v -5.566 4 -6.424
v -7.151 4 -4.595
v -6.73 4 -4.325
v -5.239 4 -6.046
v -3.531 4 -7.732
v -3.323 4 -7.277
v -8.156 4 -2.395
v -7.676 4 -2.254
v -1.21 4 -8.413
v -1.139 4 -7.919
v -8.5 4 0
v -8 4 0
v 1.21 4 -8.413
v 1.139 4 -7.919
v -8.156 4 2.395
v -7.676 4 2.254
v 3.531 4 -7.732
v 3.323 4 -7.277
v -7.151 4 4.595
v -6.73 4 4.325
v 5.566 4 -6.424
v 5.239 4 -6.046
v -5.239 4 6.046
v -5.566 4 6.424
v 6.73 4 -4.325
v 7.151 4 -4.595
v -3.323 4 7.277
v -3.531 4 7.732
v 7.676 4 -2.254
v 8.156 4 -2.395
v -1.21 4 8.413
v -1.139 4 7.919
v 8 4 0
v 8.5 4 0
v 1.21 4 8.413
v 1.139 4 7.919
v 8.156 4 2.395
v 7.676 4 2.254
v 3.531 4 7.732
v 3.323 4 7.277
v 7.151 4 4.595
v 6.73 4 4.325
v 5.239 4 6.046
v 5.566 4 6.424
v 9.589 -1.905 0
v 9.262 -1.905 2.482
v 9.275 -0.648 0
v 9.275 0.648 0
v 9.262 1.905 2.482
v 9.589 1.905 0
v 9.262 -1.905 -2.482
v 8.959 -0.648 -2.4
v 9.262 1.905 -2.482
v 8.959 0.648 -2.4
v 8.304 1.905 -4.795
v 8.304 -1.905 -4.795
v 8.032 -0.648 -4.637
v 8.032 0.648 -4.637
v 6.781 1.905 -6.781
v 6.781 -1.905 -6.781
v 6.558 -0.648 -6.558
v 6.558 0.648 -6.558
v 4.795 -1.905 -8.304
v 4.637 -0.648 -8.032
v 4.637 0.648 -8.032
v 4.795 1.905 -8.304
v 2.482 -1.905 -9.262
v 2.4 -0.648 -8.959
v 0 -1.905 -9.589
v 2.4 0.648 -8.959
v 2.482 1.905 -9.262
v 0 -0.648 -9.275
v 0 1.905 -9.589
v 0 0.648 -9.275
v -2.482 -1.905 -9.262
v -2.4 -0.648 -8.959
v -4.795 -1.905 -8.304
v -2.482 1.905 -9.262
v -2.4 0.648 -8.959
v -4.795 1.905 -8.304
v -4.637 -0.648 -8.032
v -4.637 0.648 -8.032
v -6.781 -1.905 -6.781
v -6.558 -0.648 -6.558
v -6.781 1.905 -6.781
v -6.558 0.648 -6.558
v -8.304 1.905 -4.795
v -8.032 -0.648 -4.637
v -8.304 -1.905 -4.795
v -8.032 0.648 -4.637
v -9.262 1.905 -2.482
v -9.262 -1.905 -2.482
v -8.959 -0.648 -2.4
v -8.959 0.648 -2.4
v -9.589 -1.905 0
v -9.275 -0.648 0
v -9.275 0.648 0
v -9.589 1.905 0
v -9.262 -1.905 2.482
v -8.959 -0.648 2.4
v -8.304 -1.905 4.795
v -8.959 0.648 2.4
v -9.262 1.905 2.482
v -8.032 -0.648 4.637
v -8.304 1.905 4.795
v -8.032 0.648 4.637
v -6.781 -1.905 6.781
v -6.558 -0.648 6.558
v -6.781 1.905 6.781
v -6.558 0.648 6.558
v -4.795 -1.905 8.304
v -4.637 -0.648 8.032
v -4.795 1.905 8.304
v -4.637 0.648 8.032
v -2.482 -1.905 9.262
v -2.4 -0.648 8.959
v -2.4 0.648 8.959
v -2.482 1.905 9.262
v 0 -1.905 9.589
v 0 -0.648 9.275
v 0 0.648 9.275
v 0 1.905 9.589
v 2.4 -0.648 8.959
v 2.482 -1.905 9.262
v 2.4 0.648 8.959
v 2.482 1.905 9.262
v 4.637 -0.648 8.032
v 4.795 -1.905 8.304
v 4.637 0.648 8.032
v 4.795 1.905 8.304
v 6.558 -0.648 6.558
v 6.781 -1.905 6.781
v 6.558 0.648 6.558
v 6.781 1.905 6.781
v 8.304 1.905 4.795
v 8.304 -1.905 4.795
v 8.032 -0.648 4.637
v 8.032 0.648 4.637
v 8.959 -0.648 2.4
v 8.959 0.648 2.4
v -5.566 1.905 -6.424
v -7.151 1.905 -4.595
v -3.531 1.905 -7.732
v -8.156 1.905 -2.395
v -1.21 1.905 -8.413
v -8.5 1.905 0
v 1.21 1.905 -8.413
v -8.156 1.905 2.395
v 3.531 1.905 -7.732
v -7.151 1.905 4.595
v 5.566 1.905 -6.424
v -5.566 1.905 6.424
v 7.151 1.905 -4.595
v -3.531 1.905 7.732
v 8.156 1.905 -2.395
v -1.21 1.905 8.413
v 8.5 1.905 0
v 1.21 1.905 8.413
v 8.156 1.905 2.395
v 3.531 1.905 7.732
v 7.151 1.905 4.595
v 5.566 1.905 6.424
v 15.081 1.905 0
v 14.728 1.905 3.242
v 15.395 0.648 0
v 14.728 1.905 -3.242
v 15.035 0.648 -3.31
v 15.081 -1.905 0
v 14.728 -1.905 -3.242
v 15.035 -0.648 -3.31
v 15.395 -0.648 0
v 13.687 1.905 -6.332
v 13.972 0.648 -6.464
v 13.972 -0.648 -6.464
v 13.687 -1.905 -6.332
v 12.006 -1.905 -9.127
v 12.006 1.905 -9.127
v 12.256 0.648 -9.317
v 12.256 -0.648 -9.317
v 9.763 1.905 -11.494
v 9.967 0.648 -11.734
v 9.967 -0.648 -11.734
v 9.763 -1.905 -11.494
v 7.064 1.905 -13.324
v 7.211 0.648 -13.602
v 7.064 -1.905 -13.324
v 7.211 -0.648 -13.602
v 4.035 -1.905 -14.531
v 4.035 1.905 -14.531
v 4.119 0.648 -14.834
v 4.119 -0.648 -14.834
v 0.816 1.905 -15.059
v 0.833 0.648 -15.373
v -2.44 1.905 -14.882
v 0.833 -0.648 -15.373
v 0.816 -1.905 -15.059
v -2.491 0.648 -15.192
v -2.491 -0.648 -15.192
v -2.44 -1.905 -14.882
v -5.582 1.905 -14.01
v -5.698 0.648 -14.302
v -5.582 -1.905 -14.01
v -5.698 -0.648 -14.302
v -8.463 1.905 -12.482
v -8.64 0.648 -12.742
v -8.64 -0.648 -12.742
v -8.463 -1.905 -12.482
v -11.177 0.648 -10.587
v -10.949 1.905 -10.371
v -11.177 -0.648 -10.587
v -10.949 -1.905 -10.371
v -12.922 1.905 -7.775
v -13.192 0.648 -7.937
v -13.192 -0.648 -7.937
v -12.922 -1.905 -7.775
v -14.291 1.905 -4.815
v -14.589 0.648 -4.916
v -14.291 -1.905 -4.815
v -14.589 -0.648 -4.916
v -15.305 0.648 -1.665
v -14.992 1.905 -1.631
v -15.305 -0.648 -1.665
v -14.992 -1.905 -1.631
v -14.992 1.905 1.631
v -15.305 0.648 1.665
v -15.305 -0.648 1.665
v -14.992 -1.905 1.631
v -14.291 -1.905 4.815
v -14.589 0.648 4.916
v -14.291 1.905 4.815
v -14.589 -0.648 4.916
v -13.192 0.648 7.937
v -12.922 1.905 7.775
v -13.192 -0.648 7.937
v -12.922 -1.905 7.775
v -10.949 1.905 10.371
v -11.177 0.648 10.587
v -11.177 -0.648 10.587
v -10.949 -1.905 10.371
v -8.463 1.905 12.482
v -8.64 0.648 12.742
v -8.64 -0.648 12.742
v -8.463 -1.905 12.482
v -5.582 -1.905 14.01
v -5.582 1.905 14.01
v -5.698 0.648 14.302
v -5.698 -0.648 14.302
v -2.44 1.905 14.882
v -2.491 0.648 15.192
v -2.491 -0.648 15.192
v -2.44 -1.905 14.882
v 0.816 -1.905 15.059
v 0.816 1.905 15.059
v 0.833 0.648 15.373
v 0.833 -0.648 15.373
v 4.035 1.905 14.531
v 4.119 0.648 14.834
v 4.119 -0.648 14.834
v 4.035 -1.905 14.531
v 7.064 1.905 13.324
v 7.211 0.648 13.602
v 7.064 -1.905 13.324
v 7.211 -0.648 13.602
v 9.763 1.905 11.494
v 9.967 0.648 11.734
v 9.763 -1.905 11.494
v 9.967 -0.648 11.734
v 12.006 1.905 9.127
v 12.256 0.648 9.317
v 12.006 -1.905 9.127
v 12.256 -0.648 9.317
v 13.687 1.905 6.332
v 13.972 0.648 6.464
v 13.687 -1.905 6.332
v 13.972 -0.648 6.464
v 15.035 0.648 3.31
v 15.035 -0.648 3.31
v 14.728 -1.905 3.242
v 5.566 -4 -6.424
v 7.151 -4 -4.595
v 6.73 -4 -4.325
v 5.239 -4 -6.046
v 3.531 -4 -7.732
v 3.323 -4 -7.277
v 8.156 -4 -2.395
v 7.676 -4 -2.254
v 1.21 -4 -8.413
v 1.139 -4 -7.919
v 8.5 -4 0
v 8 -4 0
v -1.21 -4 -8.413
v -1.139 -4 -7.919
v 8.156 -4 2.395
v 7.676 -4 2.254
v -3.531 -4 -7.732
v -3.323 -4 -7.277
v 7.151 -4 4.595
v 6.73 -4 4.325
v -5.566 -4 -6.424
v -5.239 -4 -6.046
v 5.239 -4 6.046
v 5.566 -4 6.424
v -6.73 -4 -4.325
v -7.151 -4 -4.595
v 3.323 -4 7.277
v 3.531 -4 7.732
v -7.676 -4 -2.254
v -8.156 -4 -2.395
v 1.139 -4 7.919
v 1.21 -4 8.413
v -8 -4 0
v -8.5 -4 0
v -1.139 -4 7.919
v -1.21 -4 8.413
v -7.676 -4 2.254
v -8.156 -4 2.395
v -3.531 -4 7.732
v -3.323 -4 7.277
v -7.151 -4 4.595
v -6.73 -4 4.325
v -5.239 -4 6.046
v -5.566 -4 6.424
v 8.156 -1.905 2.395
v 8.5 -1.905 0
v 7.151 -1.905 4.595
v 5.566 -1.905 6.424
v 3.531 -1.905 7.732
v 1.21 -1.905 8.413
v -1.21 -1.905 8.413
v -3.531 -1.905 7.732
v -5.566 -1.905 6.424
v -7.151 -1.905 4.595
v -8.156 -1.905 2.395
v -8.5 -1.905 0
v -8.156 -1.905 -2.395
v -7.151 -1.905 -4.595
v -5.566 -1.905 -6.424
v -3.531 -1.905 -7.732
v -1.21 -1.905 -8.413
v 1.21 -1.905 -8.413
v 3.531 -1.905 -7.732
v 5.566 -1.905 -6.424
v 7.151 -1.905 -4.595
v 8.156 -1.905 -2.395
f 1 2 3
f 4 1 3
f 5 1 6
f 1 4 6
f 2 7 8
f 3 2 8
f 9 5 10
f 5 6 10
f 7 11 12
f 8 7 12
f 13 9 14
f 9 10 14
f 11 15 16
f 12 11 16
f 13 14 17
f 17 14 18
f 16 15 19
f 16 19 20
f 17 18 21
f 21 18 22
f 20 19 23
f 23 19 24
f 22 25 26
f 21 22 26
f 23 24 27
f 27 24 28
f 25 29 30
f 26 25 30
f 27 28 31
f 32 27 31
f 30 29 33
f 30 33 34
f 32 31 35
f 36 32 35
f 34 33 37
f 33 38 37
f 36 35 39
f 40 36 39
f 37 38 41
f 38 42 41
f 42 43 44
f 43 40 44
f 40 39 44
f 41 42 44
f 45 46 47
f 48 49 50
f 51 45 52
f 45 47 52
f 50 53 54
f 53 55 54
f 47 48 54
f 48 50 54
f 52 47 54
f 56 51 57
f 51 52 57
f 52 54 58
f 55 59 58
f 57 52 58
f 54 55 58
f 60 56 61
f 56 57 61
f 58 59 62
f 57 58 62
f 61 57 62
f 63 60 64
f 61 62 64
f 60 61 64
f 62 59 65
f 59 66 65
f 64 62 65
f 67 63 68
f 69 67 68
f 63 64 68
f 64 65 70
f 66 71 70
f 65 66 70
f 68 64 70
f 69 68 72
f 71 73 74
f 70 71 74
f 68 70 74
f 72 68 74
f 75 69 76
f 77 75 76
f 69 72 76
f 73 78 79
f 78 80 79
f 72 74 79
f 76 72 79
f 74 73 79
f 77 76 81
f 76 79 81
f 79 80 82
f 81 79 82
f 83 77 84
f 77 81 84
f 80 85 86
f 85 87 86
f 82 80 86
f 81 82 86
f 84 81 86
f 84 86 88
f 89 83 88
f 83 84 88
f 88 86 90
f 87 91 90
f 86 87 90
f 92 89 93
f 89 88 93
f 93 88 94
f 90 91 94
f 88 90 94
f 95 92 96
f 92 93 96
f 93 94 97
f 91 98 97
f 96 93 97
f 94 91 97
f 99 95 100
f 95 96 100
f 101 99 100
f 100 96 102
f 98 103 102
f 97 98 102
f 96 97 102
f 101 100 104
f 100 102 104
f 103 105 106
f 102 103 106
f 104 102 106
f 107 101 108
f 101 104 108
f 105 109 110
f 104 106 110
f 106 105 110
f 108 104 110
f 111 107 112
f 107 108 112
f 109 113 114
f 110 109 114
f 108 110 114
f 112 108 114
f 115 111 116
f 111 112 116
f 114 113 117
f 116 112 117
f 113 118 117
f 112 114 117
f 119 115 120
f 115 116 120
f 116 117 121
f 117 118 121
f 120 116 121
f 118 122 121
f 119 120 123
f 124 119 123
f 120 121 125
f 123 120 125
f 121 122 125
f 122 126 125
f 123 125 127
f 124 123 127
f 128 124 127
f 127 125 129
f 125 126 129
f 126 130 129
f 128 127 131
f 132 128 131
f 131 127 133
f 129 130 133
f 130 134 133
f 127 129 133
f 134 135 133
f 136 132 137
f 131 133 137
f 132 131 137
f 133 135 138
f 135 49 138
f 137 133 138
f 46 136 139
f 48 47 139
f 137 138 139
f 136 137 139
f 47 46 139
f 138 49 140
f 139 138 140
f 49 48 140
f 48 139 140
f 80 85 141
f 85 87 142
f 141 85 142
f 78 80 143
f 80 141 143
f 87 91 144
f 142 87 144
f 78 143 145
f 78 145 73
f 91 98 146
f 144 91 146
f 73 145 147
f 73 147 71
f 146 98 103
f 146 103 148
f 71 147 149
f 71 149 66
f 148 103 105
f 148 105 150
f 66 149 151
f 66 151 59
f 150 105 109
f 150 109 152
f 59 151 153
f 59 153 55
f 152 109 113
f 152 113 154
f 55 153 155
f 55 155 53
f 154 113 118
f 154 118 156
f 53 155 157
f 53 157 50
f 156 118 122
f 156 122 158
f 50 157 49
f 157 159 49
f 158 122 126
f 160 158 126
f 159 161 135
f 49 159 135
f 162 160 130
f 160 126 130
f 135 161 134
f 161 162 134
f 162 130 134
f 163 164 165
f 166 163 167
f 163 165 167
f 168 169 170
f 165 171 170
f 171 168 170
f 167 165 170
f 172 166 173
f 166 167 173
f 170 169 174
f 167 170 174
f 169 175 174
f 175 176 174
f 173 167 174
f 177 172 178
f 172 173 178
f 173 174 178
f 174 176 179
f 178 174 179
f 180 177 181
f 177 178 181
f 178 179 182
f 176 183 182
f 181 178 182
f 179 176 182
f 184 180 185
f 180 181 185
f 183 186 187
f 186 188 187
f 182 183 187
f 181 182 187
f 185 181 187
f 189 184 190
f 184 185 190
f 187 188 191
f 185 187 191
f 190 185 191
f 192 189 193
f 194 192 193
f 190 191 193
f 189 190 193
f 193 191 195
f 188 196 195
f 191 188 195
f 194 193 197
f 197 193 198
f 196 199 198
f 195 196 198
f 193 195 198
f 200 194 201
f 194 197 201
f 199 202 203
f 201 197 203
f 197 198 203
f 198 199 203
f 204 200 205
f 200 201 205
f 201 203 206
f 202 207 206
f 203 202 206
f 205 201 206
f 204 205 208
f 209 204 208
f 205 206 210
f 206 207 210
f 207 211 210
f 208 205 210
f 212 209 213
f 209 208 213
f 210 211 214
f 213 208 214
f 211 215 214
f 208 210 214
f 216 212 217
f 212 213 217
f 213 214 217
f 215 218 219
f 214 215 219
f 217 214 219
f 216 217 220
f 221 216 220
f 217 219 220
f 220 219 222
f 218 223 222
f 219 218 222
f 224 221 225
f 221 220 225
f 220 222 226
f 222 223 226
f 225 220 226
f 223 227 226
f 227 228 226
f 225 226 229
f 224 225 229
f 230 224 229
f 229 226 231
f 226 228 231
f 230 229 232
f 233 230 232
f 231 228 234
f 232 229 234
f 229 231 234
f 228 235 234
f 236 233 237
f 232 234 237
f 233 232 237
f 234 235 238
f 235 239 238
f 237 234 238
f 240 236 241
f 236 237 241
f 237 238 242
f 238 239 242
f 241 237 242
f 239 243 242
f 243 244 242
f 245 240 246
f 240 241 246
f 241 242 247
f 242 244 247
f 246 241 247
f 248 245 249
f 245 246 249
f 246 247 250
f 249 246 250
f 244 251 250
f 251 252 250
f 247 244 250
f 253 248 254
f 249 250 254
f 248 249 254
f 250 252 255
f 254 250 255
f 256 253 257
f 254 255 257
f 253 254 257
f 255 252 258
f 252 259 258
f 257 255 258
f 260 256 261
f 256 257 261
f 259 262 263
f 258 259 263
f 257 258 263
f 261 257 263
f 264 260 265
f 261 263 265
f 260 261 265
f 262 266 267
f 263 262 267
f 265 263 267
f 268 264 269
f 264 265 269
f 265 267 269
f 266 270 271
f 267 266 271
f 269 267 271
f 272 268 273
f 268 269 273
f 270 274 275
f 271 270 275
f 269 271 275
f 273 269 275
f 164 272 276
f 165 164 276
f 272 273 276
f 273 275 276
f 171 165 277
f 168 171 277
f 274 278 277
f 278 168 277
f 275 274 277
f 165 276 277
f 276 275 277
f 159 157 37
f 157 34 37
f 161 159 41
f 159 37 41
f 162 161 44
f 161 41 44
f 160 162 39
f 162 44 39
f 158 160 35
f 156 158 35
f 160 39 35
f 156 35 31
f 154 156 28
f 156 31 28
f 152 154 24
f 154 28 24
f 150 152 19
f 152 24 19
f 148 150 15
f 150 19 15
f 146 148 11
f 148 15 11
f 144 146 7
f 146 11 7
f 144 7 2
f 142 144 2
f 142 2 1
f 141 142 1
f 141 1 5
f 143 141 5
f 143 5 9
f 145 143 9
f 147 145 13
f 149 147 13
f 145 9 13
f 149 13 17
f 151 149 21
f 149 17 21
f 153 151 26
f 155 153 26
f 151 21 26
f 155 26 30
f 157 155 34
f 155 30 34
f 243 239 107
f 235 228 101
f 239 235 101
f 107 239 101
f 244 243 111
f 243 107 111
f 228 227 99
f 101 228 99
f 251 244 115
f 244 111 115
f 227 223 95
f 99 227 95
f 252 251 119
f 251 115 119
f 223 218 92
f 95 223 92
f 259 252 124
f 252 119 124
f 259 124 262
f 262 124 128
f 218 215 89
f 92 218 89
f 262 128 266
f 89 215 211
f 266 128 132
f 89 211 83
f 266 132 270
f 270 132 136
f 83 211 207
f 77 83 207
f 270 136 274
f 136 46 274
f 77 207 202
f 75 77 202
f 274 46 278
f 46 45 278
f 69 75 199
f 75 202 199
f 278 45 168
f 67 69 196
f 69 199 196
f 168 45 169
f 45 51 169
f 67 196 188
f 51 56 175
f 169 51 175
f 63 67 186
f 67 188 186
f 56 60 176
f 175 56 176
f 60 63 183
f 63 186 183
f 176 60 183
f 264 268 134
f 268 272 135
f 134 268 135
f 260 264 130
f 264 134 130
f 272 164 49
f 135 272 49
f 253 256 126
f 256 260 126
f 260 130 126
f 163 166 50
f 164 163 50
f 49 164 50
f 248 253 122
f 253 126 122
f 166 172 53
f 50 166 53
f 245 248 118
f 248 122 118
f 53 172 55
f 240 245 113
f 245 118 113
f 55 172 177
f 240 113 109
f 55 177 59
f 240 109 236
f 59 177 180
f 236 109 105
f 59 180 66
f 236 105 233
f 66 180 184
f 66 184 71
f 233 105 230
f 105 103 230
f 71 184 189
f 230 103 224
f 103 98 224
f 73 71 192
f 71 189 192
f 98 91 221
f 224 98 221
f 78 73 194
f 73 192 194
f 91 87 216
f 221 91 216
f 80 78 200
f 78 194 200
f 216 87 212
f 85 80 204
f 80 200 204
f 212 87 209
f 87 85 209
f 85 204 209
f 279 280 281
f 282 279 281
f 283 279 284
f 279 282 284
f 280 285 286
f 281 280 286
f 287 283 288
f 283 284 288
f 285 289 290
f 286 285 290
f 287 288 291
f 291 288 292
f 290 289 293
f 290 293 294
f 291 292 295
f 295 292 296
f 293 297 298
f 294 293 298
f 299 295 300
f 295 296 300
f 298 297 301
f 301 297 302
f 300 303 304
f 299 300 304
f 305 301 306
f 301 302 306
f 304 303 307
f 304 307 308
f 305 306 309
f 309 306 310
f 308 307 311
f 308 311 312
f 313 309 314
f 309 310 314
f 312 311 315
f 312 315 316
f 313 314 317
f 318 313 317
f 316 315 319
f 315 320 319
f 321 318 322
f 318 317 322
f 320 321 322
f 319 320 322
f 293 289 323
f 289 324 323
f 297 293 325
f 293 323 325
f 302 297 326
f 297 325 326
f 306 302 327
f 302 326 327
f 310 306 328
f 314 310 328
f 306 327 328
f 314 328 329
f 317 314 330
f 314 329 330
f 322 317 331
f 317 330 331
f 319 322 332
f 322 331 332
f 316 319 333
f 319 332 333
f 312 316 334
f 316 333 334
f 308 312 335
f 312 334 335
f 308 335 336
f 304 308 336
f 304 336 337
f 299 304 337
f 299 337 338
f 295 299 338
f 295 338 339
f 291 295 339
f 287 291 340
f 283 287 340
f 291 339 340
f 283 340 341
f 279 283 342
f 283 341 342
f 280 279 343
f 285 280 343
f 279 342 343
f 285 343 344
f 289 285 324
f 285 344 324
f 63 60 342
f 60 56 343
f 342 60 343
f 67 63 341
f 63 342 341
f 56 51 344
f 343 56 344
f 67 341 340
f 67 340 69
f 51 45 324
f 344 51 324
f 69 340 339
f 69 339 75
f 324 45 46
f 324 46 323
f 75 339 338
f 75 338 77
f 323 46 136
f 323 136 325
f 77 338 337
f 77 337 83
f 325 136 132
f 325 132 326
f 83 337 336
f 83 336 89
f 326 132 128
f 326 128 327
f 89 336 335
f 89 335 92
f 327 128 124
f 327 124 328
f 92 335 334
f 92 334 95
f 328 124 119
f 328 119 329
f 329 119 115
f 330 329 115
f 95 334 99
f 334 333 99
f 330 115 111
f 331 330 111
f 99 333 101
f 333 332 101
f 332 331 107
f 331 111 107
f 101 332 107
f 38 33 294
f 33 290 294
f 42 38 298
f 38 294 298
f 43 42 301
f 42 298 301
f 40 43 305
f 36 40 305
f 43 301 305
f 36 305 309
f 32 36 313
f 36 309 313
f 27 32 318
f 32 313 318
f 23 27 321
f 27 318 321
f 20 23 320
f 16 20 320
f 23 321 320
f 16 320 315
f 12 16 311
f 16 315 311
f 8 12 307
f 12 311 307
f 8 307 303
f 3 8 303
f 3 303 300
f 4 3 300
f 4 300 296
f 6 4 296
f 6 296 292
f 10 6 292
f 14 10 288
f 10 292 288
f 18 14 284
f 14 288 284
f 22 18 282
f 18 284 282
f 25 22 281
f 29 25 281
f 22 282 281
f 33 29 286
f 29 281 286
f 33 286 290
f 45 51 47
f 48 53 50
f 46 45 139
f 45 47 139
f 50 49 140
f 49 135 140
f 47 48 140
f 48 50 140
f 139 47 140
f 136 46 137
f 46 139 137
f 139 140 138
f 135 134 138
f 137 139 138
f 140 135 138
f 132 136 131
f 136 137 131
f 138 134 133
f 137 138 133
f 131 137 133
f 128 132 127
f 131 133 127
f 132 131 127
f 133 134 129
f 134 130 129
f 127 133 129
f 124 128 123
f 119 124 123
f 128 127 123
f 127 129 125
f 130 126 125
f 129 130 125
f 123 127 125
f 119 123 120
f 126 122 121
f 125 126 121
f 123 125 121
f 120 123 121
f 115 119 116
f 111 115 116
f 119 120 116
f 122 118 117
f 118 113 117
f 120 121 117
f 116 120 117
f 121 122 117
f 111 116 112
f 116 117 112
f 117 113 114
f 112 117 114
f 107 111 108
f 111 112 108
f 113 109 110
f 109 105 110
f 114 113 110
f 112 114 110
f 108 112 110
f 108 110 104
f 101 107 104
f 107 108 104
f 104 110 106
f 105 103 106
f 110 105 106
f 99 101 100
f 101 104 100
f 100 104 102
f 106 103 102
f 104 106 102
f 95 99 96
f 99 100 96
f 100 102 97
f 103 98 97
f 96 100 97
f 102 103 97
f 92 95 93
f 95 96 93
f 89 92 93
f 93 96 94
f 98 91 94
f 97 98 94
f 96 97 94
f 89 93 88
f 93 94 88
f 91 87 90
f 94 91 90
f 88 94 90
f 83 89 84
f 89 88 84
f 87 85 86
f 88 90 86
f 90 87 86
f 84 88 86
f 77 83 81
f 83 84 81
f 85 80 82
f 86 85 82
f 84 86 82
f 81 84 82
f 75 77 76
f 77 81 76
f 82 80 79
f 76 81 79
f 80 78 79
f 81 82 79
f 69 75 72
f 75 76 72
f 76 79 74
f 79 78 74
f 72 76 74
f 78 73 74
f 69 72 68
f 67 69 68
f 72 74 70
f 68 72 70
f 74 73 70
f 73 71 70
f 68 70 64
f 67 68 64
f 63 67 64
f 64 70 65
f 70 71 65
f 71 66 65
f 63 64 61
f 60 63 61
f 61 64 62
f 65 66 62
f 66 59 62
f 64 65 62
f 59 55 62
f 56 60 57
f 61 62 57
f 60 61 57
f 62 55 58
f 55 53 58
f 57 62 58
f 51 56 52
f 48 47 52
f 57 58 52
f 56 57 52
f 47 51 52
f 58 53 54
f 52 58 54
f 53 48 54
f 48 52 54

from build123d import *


with BuildPart() as part:
    # Sketch1 → Revolve1 (revolve)
    with BuildSketch(Plane.XY):
        with BuildLine():
            Line((8, 4), (8, -4))
            Line((8, -4), (8.5, -4))
            Line((8.5, -4), (8.5, -1.905))
            Line((8.5, -1.905), (9.589196223, -1.905))
            ThreePointArc((9.589196223, -1.905), (9.235, 0), (9.589196223, 1.905))
            Line((9.589196223, 1.905), (8.5, 1.905))
            Line((8.5, 1.905), (8.5, 4))
            Line((8.5, 4), (8, 4))
        make_face()
    revolve(axis=Axis((0, 4, 0), (0, -1, 0)))


with BuildPart() as body_2:
    # Sketch2 → Revolve2 (revolve)
    with BuildSketch(Plane.XY):
        with BuildLine():
            Line((9.589196223, 1.905), (15.080803777, 1.905))
            ThreePointArc((15.080803777, 1.905), (15.435, 0), (15.080803777, -1.905))
            Line((15.080803777, -1.905), (9.589196223, -1.905))
            ThreePointArc((9.589196223, -1.905), (9.235, 0), (9.589196223, 1.905))
        make_face()
    revolve(axis=Axis((0, -4, 0), (0, 1, 0)))


solid = Compound([part.part, body_2.part])
